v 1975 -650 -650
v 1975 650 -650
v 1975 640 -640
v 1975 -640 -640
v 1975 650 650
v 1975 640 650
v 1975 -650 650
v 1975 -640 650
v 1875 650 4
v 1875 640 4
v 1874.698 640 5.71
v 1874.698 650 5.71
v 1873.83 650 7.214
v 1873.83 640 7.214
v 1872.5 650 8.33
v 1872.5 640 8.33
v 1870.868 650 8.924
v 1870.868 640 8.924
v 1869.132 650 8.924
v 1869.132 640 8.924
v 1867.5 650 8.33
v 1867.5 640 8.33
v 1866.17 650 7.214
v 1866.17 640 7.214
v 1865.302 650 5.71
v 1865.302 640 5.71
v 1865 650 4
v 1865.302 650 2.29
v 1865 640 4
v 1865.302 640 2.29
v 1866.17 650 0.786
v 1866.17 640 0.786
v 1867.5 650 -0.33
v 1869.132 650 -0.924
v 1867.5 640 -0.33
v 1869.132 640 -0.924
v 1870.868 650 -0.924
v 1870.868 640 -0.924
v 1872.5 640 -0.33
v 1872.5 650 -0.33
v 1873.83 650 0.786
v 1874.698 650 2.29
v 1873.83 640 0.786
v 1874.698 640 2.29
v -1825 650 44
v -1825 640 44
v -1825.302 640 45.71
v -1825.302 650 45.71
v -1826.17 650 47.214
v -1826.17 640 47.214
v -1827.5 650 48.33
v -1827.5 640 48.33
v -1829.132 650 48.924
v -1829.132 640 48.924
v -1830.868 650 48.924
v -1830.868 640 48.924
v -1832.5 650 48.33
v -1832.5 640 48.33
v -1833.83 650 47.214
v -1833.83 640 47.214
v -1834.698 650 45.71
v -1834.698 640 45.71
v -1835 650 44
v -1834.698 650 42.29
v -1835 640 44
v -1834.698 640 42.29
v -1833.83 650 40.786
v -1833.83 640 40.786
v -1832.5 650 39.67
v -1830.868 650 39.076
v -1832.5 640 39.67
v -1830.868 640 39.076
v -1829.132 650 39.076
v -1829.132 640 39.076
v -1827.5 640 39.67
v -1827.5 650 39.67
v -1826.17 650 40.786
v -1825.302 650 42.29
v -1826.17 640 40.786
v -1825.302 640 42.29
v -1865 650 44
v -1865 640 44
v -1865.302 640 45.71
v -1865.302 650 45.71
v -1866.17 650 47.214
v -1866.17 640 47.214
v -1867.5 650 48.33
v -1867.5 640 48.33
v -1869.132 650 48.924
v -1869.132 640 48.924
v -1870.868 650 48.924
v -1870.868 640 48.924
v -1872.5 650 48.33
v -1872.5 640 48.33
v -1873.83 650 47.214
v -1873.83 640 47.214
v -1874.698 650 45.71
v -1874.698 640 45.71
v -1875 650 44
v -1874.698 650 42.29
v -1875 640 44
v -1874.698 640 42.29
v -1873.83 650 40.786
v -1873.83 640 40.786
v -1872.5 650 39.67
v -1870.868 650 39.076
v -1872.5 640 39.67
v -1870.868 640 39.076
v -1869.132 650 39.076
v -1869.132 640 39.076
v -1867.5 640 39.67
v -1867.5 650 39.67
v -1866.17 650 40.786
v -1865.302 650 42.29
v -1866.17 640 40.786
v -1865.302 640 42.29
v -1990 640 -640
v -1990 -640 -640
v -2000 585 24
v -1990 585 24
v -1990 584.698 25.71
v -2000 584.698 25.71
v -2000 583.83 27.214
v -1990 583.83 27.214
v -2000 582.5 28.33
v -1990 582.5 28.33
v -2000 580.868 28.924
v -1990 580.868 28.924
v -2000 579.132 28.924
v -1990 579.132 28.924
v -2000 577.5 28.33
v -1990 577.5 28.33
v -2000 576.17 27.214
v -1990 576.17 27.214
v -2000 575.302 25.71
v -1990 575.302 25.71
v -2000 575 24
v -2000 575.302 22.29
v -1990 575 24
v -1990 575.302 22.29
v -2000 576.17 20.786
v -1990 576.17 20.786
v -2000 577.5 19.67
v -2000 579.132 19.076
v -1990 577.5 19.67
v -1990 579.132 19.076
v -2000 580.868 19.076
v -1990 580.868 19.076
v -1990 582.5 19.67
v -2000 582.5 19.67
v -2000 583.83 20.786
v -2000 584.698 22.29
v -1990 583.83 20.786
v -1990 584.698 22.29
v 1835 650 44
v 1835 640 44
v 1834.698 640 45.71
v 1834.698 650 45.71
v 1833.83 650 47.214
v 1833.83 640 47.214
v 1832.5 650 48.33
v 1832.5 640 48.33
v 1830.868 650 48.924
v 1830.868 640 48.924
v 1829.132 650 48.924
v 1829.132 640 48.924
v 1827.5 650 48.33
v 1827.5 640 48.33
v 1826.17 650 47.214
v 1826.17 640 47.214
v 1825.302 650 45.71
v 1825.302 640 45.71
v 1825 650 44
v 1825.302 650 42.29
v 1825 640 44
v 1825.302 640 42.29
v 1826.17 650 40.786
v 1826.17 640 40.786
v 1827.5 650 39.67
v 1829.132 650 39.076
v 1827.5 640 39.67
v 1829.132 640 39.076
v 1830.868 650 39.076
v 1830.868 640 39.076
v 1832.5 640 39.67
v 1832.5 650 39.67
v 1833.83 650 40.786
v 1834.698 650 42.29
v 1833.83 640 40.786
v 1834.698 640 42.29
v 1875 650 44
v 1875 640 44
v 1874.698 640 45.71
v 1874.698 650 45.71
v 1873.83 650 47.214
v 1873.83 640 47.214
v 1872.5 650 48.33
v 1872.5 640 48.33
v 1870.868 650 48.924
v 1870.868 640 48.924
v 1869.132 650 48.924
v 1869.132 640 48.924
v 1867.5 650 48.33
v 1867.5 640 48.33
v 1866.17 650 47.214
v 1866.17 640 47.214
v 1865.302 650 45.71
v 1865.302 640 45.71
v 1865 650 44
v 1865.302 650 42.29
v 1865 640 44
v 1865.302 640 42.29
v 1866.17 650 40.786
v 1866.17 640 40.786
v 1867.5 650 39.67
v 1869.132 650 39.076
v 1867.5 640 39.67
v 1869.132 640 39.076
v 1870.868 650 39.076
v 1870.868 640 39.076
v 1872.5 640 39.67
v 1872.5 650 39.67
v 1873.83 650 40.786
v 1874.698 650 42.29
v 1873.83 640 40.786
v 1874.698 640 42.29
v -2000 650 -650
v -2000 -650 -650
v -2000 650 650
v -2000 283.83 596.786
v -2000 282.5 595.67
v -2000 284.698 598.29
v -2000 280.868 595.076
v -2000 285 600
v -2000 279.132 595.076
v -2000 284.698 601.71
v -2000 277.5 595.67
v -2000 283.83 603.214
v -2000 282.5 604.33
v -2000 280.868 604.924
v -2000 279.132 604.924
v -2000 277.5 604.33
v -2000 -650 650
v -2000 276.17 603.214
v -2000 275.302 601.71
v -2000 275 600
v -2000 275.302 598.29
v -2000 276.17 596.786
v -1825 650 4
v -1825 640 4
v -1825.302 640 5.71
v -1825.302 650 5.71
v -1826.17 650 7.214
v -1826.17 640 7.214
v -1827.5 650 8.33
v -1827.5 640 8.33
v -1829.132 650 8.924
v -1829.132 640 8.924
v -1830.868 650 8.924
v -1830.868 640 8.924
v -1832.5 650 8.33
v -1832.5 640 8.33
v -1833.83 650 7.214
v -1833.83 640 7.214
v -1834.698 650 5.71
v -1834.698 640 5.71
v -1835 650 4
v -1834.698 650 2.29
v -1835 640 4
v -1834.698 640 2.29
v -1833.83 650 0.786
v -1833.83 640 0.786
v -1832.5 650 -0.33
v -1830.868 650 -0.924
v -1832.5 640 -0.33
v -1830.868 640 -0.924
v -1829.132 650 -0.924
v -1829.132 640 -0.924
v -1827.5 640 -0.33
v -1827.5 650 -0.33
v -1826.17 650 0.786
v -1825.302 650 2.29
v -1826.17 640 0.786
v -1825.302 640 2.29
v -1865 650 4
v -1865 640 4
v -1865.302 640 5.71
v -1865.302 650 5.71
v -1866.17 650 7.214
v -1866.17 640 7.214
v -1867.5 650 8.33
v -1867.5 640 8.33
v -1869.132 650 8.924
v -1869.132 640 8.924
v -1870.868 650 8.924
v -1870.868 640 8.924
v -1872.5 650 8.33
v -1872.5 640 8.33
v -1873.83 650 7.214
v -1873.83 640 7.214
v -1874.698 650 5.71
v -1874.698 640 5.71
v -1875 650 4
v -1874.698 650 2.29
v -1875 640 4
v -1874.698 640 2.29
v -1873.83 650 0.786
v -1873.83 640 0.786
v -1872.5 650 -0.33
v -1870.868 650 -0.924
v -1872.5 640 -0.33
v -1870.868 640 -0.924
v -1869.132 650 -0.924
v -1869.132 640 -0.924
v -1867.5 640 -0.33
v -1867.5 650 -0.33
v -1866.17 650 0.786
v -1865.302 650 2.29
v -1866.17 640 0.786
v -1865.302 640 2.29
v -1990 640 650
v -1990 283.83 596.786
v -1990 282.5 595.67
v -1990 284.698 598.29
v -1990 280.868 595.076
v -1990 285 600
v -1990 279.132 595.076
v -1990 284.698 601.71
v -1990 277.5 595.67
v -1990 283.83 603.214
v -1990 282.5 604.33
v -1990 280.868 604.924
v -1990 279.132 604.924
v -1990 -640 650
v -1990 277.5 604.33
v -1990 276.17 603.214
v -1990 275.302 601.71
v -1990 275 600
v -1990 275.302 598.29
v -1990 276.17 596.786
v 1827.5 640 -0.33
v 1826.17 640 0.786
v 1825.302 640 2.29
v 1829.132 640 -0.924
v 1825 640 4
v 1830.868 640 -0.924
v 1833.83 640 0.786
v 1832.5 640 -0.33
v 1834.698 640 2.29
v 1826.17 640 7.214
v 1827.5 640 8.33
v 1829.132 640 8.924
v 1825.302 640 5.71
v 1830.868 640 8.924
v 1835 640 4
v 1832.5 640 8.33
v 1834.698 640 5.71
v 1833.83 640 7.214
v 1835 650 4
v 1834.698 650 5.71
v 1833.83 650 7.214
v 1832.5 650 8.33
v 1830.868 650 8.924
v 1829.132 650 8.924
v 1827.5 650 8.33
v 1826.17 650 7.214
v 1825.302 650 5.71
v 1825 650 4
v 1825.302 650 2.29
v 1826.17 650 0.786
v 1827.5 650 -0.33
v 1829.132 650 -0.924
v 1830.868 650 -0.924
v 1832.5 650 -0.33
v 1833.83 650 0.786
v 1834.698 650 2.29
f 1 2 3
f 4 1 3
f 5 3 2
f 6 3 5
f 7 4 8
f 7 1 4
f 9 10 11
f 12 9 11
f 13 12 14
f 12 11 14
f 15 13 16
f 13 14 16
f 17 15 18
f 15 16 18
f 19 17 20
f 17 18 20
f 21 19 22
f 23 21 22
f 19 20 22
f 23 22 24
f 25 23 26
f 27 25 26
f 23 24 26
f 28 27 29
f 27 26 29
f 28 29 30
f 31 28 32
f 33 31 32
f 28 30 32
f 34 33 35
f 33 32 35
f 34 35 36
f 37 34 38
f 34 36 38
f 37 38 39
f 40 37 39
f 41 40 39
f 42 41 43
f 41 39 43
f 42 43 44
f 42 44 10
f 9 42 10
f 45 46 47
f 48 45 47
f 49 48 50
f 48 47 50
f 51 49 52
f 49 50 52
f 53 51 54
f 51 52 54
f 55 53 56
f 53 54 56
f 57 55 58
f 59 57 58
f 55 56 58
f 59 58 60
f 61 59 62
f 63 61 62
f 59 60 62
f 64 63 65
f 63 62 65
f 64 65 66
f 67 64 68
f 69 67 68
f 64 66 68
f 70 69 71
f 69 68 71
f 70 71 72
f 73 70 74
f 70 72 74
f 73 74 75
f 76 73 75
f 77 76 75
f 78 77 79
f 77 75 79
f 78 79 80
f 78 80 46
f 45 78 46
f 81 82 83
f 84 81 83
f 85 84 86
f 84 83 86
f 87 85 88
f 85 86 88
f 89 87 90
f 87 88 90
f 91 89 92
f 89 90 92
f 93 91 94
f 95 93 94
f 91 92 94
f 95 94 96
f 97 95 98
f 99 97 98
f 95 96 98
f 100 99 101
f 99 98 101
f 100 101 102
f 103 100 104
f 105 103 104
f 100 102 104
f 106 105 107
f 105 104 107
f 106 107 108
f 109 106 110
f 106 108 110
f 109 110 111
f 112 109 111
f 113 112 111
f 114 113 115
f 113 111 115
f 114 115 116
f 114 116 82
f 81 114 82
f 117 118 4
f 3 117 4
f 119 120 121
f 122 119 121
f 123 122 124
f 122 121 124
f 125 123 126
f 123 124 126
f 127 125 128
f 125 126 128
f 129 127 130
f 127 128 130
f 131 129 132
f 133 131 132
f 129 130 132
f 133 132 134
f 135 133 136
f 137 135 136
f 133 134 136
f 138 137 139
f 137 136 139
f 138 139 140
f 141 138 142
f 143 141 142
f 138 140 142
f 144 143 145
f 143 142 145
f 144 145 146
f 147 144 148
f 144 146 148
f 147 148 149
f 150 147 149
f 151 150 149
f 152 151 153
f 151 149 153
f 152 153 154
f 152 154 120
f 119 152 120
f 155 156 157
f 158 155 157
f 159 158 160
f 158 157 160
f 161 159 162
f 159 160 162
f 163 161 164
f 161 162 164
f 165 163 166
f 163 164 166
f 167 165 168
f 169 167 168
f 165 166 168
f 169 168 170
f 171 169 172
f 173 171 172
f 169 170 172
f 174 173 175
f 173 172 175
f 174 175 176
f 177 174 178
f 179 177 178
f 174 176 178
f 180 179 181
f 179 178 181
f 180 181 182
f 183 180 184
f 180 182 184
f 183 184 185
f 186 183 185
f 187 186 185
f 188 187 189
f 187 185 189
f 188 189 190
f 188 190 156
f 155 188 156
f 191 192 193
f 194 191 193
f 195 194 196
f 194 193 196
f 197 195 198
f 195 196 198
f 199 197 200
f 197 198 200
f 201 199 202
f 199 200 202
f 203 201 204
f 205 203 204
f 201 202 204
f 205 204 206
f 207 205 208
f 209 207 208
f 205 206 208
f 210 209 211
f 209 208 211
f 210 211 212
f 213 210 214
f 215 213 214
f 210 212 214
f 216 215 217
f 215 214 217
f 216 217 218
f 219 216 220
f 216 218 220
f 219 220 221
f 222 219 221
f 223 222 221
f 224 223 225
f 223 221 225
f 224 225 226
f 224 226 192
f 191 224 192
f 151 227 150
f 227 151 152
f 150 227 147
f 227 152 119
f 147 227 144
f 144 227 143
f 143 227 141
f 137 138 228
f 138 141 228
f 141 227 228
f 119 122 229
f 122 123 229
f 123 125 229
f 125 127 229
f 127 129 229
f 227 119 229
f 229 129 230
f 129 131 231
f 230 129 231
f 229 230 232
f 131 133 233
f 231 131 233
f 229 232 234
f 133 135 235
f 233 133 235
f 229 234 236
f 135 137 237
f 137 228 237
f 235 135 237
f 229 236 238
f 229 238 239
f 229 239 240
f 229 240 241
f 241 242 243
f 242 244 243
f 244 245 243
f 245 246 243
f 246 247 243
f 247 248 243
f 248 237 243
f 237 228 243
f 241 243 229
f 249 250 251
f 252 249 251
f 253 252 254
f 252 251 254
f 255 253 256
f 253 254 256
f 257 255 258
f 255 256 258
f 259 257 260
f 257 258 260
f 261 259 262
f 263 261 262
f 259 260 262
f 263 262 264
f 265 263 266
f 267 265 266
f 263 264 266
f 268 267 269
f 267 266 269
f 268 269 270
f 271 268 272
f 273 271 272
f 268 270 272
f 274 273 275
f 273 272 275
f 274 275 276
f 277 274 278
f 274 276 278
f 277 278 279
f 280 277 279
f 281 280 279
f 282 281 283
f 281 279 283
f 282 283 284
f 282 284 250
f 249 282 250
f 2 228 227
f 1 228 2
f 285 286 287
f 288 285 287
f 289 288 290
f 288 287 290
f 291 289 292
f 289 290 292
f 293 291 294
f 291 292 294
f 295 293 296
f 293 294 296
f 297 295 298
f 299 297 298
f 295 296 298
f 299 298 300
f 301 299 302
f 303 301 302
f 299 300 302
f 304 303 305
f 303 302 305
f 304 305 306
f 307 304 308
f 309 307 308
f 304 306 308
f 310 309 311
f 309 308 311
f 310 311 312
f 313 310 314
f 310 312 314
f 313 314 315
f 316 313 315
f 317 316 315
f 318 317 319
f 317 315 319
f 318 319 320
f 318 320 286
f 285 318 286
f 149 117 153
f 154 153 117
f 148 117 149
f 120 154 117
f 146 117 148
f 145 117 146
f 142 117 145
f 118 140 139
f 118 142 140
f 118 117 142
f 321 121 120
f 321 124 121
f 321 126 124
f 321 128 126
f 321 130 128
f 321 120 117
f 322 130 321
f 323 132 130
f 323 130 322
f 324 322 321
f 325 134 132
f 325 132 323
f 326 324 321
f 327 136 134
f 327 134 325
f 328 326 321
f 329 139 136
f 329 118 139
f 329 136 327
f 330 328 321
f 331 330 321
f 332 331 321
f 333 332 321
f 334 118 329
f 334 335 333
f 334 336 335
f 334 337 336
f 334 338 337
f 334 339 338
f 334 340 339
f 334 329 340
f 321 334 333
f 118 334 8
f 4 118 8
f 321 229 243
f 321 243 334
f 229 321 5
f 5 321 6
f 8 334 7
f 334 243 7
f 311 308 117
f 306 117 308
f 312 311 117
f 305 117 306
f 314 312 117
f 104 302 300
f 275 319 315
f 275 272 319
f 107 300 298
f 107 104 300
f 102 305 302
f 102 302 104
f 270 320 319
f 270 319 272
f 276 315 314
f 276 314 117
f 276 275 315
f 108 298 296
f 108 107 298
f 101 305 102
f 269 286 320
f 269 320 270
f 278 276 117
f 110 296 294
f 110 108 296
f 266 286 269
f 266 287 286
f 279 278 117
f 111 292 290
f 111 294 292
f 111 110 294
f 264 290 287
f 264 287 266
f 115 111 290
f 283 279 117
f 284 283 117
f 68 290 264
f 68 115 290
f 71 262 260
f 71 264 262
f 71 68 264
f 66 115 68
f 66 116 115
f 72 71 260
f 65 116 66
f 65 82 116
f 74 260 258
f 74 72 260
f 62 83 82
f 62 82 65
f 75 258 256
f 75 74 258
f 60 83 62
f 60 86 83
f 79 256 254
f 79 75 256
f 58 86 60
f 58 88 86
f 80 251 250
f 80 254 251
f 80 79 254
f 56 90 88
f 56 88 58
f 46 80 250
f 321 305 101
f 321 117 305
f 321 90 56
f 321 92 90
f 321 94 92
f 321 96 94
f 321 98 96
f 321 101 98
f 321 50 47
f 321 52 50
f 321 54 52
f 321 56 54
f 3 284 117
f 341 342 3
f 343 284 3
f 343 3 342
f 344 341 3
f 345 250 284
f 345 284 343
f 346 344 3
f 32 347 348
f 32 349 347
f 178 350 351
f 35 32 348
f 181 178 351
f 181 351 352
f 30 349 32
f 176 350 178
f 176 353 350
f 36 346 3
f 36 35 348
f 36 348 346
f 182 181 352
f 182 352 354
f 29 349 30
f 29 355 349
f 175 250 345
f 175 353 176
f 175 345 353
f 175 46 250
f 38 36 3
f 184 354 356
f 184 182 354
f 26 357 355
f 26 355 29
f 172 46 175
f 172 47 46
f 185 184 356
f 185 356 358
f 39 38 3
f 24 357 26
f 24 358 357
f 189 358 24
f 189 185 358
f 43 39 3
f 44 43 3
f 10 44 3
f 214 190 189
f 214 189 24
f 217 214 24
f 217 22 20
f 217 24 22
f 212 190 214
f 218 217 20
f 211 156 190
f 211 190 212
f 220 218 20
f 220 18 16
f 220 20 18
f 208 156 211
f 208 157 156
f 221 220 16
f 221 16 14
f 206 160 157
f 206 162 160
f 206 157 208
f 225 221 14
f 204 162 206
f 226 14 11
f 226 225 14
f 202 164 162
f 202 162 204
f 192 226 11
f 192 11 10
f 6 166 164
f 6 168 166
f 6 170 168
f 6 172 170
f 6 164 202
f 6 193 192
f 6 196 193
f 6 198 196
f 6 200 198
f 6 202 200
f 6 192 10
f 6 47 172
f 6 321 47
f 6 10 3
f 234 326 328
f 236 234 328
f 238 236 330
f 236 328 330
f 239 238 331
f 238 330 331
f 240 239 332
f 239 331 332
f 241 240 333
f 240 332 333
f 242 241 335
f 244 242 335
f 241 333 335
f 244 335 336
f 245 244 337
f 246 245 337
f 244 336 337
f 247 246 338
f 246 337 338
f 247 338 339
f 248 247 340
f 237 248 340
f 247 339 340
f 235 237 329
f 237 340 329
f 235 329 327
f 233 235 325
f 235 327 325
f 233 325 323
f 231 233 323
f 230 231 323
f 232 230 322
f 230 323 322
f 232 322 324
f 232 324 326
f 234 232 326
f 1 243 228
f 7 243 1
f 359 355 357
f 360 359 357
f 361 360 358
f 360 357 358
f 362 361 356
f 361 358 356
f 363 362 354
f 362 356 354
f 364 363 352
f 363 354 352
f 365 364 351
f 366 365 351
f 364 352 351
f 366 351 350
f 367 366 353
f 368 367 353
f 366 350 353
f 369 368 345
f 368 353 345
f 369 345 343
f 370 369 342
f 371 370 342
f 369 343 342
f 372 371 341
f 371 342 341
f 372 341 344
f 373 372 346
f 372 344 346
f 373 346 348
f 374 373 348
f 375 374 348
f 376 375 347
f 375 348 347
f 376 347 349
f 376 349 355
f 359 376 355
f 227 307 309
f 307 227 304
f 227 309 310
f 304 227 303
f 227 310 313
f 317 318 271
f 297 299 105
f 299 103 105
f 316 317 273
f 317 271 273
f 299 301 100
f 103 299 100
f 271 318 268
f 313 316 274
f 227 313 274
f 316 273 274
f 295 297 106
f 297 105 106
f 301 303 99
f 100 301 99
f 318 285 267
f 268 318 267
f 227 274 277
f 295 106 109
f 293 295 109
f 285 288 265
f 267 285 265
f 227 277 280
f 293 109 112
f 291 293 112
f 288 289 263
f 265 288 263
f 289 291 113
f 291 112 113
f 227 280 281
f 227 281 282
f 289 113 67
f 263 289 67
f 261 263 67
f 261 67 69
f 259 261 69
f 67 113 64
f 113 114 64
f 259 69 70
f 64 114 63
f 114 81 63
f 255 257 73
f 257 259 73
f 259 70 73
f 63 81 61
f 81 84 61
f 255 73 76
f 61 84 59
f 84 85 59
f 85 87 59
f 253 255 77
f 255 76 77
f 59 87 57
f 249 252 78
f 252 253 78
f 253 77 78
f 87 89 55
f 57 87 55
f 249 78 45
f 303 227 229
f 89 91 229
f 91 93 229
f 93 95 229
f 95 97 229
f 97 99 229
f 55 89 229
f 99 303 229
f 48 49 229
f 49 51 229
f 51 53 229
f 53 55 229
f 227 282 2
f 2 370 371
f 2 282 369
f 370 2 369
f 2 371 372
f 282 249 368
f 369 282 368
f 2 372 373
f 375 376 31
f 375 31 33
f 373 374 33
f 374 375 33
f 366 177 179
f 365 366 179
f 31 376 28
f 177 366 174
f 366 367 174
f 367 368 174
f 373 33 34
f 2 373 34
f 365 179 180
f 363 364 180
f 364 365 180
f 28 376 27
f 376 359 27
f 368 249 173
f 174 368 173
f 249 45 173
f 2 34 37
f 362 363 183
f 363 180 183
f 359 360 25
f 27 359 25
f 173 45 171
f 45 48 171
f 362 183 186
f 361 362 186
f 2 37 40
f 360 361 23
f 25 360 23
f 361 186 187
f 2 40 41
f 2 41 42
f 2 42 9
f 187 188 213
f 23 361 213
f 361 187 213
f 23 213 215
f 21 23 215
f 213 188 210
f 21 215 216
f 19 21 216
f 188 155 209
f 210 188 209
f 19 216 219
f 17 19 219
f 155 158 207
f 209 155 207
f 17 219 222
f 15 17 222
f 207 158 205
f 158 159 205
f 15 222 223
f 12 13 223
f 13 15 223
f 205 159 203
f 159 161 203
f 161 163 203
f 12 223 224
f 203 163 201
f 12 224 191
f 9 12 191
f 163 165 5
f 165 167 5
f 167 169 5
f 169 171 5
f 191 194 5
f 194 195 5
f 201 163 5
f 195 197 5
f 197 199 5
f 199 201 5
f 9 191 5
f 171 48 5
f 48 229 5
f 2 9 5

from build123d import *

# Parameters (mm, degrees)
F0_W     = 4000
F0_H     = 1300
F1_DEPTH = 650
F2_T     = -10
F4_D     = 10
F5_D     = 10
F7_D     = 10
F7_DEPTH = 10.001
F8_D     = 10
F8_DEPTH = 10.001
F9_DEPTH = 25


with BuildPart() as f1:
    # F0 (on Front) → F1 (new body, symmetric)
    with BuildSketch(Plane.XZ):
        Rectangle(F0_W, F0_H)
    extrude(amount=F1_DEPTH, both=True)

    # F2
    f2_openings = [f1.faces().sort_by_distance(p)[0] for p in [
        (0, 0, 650),
    ]]
    offset(amount=F2_T, openings=f2_openings)

    # F4 (through all)
    with Locations(Plane(origin=(-2000, 0, 0), x_dir=(0, -1, 0), z_dir=(-1, 0, 0))):
        with Locations((-580, 24)):
            Hole(F4_D / 2)

    # F5 (through all)
    with Locations(Plane(origin=(-2000, 0, 0), x_dir=(0, -1, 0), z_dir=(-1, 0, 0))):
        with Locations((-280, 600)):
            Hole(F5_D / 2)

    # F7 (through all, one way)
    with BuildSketch(Plane.XZ.offset(-640)):
        with Locations((-1870, 44), (-1830, 44), (-1830, 4), (-1870, 4)):
            Circle(F7_D / 2)
    extrude(amount=-F7_DEPTH, mode=Mode.SUBTRACT)

    # F8 (through all, one way)
    with BuildSketch(Plane.XZ.offset(-640)):
        with Locations((1830, 44), (1870, 44), (1870, 4), (1830, 4)):
            Circle(F8_D / 2)
    extrude(amount=-F8_DEPTH, mode=Mode.SUBTRACT)

    # F9 (cut): a face of the model
    f9_faces = [f1.faces().sort_by_distance(p)[0] for p in [
        (2000, -0.0399707223, -0.0290020124),
    ]]
    extrude(f9_faces, amount=-F9_DEPTH, mode=Mode.SUBTRACT)


solid = f1.part
